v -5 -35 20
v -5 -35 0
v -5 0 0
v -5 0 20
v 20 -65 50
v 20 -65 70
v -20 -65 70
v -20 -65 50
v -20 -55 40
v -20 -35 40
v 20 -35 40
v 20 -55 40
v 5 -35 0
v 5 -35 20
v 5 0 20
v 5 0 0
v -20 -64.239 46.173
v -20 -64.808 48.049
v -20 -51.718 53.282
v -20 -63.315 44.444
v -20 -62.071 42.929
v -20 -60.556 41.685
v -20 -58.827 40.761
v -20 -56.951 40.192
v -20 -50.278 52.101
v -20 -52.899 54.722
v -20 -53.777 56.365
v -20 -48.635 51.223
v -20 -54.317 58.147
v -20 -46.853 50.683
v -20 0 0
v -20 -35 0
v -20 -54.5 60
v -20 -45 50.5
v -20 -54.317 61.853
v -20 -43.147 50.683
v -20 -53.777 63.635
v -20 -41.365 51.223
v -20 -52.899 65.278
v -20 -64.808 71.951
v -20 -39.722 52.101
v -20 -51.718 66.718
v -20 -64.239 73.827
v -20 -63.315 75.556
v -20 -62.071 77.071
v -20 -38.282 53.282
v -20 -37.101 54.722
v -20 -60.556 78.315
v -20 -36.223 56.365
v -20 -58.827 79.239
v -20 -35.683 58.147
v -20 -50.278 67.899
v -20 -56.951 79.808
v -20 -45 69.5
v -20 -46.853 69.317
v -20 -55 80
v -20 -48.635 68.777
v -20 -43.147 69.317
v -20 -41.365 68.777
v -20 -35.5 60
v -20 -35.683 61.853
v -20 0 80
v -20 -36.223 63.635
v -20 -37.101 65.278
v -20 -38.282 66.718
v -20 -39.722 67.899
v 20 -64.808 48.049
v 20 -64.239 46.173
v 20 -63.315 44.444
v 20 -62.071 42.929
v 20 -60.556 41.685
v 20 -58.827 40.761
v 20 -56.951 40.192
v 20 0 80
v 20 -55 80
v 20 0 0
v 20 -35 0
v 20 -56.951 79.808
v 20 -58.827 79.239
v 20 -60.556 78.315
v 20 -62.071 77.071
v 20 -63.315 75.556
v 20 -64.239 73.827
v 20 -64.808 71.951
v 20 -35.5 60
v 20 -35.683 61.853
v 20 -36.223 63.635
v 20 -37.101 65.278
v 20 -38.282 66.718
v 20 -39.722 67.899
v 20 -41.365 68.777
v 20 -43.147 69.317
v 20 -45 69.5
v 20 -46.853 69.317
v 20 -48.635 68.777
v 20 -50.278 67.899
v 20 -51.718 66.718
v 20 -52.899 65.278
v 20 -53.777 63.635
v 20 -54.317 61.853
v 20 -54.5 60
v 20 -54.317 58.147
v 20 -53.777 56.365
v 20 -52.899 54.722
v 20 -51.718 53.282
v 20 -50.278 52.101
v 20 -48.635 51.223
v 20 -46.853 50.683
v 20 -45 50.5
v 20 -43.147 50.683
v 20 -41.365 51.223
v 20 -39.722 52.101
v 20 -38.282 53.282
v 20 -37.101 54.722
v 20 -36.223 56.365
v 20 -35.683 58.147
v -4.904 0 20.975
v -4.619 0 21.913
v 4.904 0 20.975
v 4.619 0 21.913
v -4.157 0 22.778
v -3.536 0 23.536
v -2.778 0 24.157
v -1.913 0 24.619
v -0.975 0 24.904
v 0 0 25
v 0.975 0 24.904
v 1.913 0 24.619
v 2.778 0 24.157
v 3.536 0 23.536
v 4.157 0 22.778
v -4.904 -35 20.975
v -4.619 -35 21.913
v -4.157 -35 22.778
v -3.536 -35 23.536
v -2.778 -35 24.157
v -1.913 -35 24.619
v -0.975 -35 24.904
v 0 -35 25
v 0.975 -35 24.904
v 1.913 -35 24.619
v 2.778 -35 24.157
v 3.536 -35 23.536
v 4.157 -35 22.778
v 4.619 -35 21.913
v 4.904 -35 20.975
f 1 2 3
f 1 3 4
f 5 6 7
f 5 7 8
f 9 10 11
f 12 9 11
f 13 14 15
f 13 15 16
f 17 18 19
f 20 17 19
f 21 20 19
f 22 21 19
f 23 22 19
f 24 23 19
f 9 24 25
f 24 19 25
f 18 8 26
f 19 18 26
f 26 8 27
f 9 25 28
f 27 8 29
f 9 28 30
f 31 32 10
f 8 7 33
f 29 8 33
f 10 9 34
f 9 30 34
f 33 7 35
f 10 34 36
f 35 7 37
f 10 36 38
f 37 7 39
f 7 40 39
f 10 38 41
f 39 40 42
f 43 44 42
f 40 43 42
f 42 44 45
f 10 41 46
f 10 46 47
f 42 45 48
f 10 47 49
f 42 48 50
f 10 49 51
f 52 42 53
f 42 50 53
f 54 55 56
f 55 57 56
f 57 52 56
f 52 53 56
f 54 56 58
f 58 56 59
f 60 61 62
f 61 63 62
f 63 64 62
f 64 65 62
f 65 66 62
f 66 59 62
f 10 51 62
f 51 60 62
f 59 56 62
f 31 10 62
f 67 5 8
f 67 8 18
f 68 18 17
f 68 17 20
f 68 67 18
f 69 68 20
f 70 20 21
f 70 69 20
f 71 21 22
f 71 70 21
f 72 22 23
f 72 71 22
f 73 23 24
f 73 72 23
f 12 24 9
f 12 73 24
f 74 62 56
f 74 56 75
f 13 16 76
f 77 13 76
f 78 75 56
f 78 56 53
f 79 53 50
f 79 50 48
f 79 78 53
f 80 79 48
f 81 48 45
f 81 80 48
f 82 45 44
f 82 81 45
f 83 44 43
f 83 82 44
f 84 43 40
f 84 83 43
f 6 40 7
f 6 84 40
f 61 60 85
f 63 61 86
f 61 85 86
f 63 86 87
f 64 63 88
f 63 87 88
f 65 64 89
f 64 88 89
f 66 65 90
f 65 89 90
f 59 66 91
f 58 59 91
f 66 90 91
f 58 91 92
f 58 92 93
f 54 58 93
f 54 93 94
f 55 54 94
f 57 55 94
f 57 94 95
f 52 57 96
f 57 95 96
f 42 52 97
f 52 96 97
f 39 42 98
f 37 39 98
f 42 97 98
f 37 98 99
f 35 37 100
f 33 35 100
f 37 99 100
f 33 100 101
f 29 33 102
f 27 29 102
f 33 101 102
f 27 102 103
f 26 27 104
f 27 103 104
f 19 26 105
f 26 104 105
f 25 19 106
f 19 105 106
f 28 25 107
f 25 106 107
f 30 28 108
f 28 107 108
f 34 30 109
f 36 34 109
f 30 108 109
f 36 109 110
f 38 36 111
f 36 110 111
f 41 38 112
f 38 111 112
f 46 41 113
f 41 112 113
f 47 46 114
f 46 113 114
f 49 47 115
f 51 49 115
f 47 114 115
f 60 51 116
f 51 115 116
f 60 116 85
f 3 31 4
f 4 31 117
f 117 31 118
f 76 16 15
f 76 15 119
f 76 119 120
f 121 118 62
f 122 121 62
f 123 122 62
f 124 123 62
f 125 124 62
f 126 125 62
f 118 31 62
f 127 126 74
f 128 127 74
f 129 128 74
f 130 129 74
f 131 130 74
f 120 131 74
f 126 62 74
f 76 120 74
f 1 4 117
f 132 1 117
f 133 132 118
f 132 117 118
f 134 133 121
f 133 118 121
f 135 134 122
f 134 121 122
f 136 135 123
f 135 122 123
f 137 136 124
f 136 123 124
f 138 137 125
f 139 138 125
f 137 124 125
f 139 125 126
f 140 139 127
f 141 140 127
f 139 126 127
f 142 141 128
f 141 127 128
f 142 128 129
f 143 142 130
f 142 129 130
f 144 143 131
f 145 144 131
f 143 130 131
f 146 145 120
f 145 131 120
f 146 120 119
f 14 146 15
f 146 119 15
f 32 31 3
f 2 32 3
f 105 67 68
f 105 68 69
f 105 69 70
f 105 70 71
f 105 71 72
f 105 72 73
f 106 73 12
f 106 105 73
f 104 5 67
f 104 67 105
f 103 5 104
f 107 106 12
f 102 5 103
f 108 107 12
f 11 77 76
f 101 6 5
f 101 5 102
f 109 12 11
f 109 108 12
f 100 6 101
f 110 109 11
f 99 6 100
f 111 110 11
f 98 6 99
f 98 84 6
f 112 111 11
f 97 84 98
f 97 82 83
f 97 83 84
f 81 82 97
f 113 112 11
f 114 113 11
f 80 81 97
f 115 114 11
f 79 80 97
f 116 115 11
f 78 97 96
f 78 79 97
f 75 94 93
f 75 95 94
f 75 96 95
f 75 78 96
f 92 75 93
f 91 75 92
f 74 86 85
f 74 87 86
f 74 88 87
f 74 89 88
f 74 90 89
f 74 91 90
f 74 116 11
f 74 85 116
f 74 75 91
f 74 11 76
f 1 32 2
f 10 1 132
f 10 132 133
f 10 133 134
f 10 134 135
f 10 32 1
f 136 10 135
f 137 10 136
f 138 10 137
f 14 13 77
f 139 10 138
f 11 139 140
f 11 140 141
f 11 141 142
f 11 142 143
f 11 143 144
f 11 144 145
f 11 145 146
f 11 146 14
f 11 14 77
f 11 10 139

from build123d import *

# Parameters (mm, degrees)
F1_DEPTH = 35
F2_W     = 40
F2_H     = 40
F3_DEPTH = 20
F5_DEPTH = 40
F4_R     = 9.5
F6_DEPTH = 40


with BuildPart() as f1:
    # F0 (on Front) → F1 (new body)
    with BuildSketch(Plane.XZ):
        with BuildLine():
            Line((5, 20), (5, 0))
            Line((5, 0), (20, 0))
            Line((20, 0), (20, 80))
            Line((20, 80), (-20, 80))
            Line((-20, 80), (-20, 0))
            Line((-20, 0), (-5, 0))
            Line((-5, 0), (-5, 20))
            ThreePointArc((-5, 20), (0, 25), (5, 20))
        make_face()
    extrude(amount=F1_DEPTH)

    # F2 (on face) → F3 (join)
    with BuildSketch(Plane.XZ.offset(35)):
        with Locations((0, 60)):
            Rectangle(F2_W, F2_H)
    extrude(amount=F3_DEPTH)

    # F4 (on face) → F5 (join)
    with BuildSketch(Plane.YZ.offset(20)):
        with BuildLine():
            Line((-65, 70), (-65, 50))
            ThreePointArc((-65, 50), (-62.071068, 42.928932), (-55, 40))
            Line((-55, 40), (-55, 80))
            ThreePointArc((-55, 80), (-62.071068, 77.071068), (-65, 70))
        make_face()
    extrude(amount=-F5_DEPTH)

    # F4 (on face) → F6 (cut)
    with BuildSketch(Plane.YZ.offset(20)):
        with Locations((-45, 60)):
            Circle(F4_R)
    extrude(amount=-F6_DEPTH, mode=Mode.SUBTRACT)


solid = f1.part
